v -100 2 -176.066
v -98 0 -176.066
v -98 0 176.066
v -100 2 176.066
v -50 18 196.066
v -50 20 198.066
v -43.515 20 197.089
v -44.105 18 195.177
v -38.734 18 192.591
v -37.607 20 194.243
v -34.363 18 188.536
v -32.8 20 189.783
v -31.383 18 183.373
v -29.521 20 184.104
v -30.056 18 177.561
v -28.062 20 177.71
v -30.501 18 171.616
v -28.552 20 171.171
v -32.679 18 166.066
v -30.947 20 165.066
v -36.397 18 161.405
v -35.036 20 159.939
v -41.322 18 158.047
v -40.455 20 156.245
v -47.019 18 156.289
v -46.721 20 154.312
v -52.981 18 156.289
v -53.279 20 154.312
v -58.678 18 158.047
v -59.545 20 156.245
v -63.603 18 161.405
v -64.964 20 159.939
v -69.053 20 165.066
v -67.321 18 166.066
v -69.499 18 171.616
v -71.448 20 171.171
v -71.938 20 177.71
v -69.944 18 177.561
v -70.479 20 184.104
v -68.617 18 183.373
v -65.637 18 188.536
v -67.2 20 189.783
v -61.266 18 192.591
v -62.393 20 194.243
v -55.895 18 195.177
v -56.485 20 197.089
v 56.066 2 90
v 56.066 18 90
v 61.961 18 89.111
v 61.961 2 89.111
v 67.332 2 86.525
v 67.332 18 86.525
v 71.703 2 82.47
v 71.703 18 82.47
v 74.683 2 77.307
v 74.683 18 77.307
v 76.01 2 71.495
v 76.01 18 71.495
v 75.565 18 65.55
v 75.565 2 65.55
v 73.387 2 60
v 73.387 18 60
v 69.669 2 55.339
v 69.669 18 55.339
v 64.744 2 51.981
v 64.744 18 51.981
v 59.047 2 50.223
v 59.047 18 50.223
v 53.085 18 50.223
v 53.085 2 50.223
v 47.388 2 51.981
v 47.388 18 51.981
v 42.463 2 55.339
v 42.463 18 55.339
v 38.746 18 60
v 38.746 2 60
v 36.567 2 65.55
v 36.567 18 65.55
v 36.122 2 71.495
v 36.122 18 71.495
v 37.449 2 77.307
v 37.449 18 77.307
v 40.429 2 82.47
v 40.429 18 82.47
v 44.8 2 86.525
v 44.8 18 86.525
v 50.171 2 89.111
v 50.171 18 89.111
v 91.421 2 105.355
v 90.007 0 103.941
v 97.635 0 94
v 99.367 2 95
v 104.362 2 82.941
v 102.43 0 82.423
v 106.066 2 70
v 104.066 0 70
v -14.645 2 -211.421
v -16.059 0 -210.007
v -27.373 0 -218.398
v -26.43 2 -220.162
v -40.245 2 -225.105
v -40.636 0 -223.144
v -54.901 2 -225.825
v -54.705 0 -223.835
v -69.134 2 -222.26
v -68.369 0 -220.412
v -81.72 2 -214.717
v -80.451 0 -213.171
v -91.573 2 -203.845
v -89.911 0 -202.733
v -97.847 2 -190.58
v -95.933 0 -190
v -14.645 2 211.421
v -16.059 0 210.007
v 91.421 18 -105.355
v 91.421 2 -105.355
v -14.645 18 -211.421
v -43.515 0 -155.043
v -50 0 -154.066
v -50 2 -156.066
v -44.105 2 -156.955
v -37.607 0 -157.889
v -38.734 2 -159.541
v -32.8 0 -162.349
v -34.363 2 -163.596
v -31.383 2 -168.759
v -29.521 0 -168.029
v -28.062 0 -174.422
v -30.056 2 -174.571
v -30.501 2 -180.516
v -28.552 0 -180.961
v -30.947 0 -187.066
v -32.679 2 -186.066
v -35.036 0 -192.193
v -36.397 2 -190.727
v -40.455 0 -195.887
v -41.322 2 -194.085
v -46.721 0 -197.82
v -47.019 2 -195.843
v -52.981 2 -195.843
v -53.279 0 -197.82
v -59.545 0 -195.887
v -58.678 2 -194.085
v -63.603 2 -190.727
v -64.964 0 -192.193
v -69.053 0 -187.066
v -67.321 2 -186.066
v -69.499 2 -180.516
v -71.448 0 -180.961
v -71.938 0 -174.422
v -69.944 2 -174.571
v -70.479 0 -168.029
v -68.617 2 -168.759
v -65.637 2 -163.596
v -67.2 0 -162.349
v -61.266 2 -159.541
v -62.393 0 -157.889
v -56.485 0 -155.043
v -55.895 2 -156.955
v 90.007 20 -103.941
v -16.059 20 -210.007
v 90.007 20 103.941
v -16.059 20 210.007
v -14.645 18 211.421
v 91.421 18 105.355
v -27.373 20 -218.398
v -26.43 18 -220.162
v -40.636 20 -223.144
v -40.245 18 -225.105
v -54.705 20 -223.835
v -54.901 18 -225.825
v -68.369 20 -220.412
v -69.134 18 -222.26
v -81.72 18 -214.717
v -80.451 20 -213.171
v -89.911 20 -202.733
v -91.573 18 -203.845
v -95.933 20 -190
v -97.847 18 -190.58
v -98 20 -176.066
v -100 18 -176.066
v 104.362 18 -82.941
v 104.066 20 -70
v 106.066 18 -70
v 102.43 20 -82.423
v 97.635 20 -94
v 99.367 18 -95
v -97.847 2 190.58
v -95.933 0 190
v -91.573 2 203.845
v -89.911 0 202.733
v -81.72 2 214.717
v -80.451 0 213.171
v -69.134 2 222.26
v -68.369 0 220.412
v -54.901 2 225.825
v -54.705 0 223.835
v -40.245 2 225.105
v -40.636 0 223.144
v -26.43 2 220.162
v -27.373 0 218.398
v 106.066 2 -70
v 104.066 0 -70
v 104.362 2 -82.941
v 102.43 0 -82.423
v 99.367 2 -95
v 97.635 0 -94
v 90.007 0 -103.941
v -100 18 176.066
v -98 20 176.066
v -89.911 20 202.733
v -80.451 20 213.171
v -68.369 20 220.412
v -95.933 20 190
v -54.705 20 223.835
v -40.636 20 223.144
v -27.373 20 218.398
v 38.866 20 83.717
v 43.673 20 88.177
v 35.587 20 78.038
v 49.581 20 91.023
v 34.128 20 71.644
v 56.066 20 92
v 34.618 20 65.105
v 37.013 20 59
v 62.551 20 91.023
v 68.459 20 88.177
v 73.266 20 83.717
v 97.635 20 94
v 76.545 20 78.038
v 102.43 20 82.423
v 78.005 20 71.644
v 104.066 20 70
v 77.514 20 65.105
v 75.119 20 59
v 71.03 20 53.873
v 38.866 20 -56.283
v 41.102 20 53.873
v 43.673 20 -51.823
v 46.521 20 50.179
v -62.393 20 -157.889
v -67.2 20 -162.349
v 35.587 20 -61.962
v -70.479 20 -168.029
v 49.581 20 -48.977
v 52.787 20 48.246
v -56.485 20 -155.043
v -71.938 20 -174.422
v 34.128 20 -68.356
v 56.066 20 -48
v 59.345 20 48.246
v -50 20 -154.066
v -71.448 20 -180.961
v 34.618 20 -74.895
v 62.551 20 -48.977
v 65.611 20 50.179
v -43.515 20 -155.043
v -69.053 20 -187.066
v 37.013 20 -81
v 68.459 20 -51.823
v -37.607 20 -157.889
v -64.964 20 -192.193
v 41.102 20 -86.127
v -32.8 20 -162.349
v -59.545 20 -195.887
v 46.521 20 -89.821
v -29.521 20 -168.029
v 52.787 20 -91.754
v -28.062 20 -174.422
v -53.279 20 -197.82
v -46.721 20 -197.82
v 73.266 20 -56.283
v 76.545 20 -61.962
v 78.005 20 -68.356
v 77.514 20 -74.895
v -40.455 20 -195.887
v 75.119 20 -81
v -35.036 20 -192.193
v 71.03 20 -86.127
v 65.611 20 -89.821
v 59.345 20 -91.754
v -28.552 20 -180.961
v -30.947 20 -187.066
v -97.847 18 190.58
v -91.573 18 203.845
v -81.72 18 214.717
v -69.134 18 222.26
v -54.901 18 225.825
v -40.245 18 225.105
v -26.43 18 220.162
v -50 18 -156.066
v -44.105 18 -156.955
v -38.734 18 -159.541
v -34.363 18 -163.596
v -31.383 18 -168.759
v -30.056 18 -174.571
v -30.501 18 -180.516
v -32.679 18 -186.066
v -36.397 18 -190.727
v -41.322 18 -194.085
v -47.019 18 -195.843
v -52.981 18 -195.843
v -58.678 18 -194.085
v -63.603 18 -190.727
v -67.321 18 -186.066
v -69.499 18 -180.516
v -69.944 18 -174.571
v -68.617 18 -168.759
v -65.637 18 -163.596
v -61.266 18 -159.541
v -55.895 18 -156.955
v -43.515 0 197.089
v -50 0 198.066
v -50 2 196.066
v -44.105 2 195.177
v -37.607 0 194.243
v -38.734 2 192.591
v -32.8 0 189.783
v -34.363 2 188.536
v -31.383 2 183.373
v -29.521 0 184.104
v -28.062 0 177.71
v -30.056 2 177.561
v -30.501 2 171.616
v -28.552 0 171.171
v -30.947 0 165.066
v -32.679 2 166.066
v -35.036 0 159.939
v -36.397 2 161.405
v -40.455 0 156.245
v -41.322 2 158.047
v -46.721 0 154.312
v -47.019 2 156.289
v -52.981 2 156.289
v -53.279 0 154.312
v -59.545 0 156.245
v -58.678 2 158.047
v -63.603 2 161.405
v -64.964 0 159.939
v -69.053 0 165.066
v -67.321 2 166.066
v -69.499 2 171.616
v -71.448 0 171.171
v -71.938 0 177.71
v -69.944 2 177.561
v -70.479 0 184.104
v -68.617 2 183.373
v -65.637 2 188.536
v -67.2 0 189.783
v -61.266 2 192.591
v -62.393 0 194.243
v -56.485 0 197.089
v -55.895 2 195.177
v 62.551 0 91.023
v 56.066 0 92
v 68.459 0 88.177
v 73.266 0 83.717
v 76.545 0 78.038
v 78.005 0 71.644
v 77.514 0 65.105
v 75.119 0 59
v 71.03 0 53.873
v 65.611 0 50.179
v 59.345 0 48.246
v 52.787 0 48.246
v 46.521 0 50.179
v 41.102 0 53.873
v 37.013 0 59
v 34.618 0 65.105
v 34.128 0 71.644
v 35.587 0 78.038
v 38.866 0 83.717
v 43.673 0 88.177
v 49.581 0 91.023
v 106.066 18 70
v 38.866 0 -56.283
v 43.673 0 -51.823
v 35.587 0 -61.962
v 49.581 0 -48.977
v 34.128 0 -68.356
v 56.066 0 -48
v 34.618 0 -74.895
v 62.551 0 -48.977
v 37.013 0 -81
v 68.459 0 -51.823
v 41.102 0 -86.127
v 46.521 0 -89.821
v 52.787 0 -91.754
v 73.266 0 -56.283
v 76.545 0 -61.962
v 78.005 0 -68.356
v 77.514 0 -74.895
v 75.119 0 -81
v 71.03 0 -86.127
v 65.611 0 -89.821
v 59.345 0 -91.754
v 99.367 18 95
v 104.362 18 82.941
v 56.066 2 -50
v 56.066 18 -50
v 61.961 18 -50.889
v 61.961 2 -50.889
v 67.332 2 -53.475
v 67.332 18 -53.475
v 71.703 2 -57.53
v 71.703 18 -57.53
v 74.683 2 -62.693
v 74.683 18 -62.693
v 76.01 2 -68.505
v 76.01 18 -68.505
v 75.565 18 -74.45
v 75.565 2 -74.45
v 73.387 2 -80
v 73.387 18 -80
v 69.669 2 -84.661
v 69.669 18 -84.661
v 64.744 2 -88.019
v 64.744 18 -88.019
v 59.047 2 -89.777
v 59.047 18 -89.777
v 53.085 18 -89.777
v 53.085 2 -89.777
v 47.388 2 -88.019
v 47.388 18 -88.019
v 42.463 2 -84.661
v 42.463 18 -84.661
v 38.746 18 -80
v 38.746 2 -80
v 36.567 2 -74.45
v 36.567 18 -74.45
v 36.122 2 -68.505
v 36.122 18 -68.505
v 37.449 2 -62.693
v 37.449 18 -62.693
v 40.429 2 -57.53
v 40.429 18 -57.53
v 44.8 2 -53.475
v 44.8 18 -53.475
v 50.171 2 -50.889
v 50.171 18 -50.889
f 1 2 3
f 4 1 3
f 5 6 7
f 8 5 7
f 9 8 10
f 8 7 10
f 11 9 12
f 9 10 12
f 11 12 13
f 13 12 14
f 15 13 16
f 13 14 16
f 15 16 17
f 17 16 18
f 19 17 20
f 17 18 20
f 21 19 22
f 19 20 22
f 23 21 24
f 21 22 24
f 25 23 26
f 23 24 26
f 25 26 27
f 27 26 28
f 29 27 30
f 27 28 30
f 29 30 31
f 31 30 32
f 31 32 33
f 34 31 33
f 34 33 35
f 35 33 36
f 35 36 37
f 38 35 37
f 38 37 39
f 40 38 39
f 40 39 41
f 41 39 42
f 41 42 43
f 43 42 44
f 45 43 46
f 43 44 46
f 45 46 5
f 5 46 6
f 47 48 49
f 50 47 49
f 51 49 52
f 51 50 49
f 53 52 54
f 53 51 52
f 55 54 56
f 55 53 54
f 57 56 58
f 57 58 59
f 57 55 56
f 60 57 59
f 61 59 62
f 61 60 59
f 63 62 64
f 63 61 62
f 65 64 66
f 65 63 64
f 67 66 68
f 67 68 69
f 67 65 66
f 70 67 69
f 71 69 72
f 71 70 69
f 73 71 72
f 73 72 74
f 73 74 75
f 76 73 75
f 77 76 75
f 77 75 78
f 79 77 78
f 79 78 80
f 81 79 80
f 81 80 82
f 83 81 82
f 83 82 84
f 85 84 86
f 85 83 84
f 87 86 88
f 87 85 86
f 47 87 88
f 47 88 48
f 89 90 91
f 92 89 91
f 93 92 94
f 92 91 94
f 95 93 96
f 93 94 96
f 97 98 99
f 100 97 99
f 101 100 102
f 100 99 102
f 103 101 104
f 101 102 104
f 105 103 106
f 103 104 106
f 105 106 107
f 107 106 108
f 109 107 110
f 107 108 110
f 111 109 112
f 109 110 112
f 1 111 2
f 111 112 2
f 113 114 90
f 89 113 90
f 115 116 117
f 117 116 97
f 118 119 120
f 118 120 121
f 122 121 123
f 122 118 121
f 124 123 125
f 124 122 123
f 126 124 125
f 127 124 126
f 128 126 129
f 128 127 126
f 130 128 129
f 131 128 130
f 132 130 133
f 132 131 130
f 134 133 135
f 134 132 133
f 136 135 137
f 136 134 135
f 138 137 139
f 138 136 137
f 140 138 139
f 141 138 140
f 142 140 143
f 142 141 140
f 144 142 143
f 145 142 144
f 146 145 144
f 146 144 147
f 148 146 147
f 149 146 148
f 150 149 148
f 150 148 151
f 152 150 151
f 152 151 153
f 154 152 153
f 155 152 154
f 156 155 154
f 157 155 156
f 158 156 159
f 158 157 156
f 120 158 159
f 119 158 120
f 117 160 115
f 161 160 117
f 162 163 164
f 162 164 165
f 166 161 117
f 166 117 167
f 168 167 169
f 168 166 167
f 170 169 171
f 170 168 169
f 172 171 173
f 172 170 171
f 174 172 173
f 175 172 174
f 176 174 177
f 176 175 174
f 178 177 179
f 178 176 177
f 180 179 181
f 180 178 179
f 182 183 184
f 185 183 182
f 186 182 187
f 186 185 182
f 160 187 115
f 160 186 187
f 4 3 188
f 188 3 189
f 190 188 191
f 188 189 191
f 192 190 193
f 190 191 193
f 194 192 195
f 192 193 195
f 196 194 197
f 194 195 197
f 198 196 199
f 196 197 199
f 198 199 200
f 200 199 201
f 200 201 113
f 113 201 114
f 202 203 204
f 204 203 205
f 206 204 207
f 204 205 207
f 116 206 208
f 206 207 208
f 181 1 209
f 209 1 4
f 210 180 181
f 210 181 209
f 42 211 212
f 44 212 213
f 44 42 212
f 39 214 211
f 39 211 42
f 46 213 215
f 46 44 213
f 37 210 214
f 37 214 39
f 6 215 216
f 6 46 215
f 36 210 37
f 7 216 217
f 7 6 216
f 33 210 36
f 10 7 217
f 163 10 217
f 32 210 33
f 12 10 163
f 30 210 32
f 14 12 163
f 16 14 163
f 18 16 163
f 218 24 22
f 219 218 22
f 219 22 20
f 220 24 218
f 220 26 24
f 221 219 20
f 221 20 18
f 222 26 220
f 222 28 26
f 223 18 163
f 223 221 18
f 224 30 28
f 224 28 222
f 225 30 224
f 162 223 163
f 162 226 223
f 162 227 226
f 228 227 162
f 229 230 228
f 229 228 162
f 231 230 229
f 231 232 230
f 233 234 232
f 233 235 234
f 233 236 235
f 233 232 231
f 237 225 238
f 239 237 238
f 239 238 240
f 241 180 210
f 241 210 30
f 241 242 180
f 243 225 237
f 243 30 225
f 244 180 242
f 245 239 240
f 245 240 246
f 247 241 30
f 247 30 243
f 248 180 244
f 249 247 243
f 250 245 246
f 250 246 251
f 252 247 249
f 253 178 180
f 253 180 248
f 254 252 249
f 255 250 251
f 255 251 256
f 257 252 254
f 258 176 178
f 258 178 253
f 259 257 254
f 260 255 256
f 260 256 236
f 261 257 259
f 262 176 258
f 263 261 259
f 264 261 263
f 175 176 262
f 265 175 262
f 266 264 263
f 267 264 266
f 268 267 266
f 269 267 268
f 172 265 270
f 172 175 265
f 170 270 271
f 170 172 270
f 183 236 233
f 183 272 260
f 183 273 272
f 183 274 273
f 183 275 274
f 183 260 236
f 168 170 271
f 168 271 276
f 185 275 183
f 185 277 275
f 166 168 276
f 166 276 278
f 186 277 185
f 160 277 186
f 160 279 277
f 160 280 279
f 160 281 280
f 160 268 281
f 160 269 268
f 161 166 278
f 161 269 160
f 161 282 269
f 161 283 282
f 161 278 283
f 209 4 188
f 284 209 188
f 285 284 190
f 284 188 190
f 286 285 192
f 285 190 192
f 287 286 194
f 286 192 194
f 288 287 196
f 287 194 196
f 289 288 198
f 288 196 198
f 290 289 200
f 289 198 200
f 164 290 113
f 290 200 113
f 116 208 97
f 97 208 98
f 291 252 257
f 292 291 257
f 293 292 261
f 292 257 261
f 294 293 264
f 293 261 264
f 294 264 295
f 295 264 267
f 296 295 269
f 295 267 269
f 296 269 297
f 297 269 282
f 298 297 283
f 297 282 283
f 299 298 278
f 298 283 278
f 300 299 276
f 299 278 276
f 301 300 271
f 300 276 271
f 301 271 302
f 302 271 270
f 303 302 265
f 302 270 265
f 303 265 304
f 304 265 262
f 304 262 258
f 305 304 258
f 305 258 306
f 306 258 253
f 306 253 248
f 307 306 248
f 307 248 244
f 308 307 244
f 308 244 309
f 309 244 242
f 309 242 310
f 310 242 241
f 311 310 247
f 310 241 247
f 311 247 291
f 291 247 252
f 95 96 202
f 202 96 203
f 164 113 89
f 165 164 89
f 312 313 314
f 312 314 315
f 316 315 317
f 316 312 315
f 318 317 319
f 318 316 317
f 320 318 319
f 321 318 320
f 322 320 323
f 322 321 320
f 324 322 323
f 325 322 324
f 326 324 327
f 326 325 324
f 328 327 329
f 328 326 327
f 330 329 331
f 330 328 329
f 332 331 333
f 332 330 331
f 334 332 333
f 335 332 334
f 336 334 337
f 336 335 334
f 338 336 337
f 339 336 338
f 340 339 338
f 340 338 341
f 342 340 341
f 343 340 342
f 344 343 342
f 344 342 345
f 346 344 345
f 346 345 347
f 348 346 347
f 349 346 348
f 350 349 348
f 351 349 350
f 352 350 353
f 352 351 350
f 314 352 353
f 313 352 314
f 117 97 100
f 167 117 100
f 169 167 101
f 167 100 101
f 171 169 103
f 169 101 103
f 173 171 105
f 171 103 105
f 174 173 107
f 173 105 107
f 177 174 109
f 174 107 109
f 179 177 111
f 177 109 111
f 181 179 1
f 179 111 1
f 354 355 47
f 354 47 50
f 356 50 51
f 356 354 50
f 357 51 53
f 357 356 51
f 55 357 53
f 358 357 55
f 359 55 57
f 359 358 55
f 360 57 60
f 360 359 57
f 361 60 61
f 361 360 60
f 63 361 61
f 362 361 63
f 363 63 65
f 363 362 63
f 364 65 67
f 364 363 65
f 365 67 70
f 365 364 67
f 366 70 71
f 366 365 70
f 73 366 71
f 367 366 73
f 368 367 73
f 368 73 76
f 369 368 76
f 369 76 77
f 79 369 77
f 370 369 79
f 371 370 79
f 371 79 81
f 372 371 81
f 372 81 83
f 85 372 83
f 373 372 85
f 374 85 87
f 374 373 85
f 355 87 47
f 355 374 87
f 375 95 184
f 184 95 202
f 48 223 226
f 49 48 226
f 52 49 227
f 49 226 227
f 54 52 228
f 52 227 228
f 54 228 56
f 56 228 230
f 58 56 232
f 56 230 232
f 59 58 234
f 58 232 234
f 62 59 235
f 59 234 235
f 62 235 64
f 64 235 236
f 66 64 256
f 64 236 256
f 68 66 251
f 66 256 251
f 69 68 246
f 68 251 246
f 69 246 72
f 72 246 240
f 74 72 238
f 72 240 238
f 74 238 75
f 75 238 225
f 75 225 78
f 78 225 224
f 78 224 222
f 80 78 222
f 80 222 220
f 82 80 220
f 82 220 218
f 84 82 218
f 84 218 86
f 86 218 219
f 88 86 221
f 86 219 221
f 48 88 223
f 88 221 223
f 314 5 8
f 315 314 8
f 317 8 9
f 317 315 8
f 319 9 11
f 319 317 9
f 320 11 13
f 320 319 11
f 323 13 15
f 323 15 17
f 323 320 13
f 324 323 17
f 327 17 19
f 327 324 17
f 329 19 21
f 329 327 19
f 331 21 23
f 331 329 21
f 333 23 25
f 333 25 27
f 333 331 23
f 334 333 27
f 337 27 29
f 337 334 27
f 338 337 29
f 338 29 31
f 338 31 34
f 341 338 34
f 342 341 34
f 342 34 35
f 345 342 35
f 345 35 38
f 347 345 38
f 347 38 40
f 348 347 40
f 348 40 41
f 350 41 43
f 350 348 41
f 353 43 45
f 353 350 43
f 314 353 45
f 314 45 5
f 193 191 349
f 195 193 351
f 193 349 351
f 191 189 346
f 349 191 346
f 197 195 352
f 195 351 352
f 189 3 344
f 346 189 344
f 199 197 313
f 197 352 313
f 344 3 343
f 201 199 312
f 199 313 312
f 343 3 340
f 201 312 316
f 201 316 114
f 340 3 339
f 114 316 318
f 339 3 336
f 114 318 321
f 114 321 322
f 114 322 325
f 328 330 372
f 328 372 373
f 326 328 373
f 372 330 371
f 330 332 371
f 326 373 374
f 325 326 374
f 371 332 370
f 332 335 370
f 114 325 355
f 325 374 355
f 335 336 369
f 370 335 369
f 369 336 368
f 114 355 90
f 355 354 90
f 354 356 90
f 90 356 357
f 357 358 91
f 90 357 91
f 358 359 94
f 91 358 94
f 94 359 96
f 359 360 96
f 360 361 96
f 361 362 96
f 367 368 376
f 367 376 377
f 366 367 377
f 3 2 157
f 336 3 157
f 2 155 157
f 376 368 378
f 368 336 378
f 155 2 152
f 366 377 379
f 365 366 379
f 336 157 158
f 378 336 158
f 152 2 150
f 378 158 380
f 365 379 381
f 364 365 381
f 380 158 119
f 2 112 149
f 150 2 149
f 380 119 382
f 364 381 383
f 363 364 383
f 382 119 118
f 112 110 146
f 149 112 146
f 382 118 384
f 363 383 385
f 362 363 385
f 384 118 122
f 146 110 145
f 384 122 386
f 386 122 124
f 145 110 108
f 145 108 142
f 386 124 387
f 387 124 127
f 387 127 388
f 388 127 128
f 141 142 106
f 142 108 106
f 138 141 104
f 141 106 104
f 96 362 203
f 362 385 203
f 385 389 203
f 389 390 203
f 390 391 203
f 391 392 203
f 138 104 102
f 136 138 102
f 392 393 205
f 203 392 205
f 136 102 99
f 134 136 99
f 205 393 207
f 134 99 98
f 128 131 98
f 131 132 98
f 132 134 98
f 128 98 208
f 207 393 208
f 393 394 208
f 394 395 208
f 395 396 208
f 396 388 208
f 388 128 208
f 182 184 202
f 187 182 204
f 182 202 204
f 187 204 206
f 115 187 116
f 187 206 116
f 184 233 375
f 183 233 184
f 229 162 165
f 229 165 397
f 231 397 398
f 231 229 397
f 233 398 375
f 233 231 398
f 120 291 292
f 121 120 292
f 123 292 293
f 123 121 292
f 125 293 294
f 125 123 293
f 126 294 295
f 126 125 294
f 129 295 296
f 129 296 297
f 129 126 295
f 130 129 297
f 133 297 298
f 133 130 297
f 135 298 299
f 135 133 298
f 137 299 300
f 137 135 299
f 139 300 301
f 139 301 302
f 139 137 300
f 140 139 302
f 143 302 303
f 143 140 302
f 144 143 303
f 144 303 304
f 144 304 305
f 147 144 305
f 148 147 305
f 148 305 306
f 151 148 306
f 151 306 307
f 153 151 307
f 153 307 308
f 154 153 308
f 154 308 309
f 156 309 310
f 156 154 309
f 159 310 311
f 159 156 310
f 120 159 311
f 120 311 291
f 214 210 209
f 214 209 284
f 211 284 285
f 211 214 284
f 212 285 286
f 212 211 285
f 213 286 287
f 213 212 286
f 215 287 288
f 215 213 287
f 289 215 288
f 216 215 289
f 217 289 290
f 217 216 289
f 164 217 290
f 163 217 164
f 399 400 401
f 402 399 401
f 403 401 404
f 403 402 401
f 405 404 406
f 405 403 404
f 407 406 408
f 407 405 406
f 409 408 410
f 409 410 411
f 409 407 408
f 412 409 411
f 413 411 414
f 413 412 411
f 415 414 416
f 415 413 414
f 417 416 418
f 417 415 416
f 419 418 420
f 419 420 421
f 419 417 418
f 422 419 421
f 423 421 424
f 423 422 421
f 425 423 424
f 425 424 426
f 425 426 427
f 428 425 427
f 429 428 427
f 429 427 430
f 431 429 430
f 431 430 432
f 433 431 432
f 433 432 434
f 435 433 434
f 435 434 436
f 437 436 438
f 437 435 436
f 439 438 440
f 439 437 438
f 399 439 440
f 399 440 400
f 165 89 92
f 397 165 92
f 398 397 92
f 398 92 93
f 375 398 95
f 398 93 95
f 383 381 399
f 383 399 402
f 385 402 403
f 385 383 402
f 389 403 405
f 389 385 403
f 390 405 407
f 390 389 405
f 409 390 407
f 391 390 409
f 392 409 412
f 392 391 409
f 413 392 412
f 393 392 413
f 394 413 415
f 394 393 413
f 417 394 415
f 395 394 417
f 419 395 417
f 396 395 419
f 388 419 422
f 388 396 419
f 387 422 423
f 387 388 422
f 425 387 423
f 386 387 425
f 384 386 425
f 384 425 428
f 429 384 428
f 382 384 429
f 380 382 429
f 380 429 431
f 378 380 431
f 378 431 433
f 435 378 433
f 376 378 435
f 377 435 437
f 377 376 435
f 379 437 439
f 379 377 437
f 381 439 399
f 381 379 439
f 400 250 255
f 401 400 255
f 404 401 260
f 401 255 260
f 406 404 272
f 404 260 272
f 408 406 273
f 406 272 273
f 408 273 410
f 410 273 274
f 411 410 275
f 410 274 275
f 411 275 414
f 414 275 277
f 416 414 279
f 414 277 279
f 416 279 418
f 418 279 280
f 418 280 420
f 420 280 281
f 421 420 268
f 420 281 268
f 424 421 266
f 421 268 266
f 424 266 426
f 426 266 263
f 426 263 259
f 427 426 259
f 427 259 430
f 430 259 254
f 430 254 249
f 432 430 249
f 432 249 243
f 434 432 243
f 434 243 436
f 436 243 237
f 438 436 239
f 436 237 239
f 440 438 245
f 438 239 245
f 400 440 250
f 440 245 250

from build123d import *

# Parameters (mm, degrees)
SKETCH1_R           = 20
BOSS_EXTRUDE1_DEPTH = 20
CHAMFER1_SIZE       = 2


with BuildPart() as part:
    # Sketch1 → Boss-Extrude1 (new body)
    with BuildSketch(Plane(origin=(0, 0, 0), x_dir=(1, 0, 0), z_dir=(0, 1, 0))):
        with BuildLine():
            Line((-100, 176.066017178), (-100, -176.066017178))
            ThreePointArc((-100, -176.066017178), (-69.134171618, -222.259993804), (-14.644660941, -211.421356237))
            Line((-14.644660941, -211.421356237), (91.421356237, -105.355339059))
            ThreePointArc((91.421356237, -105.355339059), (102.259993804, -89.134171618), (106.066017178, -70))
            Line((106.066017178, -70), (106.066017178, 70))
            ThreePointArc((106.066017178, 70), (102.259993804, 89.134171618), (91.421356237, 105.355339059))
            Line((91.421356237, 105.355339059), (-14.644660941, 211.421356237))
            ThreePointArc((-14.644660941, 211.421356237), (-69.134171618, 222.259993804), (-100, 176.066017178))
        make_face()
        with Locations(Location((-50, 176.066017178, 0), (0, 0, 270))):
            Circle(SKETCH1_R, mode=Mode.SUBTRACT)
        with Locations(Location((56.066017178, 70, 0), (0, 0, 270))):
            Circle(SKETCH1_R, mode=Mode.SUBTRACT)
        with Locations(Location((56.066017178, -70, 0), (0, 0, 270))):
            Circle(SKETCH1_R, mode=Mode.SUBTRACT)
        with Locations(Location((-50, -176.066017178, 0), (0, 0, 270))):
            Circle(SKETCH1_R, mode=Mode.SUBTRACT)
    extrude(amount=BOSS_EXTRUDE1_DEPTH)

    # Chamfer1
    chamfer1_edges = [part.edges().sort_by_distance(p)[0] for p in [
        (106.066017178, 0, 0),
        (102.259993804, 0, 89.134171618),
        (38.388347648, 0, 158.388347648),
        (-69.134171618, 0, 222.259993804),
        (102.259993804, 20, 89.134171618),
        (106.066017178, 20, 0),
        (102.259993804, 20, -89.134171618),
        (-50, 0, -196.066017178),
        (-50, 20, -196.066017178),
        (38.388347648, 20, -158.388347648),
        (56.066017178, 0, -90),
        (56.066017178, 20, -90),
        (-69.134171618, 20, -222.259993804),
        (56.066017178, 0, 50),
        (56.066017178, 20, 50),
        (-100, 20, 0),
        (-50, 0, 156.066017178),
        (-50, 20, 156.066017178),
        (-69.134171618, 20, 222.259993804),
        (-100, 0, 0),
        (38.388347648, 20, 158.388347648),
        (-69.134171618, 0, -222.259993804),
        (38.388347648, 0, -158.388347648),
        (102.259993804, 0, -89.134171618),
    ]]
    chamfer(chamfer1_edges, length=CHAMFER1_SIZE)


solid = part.part
